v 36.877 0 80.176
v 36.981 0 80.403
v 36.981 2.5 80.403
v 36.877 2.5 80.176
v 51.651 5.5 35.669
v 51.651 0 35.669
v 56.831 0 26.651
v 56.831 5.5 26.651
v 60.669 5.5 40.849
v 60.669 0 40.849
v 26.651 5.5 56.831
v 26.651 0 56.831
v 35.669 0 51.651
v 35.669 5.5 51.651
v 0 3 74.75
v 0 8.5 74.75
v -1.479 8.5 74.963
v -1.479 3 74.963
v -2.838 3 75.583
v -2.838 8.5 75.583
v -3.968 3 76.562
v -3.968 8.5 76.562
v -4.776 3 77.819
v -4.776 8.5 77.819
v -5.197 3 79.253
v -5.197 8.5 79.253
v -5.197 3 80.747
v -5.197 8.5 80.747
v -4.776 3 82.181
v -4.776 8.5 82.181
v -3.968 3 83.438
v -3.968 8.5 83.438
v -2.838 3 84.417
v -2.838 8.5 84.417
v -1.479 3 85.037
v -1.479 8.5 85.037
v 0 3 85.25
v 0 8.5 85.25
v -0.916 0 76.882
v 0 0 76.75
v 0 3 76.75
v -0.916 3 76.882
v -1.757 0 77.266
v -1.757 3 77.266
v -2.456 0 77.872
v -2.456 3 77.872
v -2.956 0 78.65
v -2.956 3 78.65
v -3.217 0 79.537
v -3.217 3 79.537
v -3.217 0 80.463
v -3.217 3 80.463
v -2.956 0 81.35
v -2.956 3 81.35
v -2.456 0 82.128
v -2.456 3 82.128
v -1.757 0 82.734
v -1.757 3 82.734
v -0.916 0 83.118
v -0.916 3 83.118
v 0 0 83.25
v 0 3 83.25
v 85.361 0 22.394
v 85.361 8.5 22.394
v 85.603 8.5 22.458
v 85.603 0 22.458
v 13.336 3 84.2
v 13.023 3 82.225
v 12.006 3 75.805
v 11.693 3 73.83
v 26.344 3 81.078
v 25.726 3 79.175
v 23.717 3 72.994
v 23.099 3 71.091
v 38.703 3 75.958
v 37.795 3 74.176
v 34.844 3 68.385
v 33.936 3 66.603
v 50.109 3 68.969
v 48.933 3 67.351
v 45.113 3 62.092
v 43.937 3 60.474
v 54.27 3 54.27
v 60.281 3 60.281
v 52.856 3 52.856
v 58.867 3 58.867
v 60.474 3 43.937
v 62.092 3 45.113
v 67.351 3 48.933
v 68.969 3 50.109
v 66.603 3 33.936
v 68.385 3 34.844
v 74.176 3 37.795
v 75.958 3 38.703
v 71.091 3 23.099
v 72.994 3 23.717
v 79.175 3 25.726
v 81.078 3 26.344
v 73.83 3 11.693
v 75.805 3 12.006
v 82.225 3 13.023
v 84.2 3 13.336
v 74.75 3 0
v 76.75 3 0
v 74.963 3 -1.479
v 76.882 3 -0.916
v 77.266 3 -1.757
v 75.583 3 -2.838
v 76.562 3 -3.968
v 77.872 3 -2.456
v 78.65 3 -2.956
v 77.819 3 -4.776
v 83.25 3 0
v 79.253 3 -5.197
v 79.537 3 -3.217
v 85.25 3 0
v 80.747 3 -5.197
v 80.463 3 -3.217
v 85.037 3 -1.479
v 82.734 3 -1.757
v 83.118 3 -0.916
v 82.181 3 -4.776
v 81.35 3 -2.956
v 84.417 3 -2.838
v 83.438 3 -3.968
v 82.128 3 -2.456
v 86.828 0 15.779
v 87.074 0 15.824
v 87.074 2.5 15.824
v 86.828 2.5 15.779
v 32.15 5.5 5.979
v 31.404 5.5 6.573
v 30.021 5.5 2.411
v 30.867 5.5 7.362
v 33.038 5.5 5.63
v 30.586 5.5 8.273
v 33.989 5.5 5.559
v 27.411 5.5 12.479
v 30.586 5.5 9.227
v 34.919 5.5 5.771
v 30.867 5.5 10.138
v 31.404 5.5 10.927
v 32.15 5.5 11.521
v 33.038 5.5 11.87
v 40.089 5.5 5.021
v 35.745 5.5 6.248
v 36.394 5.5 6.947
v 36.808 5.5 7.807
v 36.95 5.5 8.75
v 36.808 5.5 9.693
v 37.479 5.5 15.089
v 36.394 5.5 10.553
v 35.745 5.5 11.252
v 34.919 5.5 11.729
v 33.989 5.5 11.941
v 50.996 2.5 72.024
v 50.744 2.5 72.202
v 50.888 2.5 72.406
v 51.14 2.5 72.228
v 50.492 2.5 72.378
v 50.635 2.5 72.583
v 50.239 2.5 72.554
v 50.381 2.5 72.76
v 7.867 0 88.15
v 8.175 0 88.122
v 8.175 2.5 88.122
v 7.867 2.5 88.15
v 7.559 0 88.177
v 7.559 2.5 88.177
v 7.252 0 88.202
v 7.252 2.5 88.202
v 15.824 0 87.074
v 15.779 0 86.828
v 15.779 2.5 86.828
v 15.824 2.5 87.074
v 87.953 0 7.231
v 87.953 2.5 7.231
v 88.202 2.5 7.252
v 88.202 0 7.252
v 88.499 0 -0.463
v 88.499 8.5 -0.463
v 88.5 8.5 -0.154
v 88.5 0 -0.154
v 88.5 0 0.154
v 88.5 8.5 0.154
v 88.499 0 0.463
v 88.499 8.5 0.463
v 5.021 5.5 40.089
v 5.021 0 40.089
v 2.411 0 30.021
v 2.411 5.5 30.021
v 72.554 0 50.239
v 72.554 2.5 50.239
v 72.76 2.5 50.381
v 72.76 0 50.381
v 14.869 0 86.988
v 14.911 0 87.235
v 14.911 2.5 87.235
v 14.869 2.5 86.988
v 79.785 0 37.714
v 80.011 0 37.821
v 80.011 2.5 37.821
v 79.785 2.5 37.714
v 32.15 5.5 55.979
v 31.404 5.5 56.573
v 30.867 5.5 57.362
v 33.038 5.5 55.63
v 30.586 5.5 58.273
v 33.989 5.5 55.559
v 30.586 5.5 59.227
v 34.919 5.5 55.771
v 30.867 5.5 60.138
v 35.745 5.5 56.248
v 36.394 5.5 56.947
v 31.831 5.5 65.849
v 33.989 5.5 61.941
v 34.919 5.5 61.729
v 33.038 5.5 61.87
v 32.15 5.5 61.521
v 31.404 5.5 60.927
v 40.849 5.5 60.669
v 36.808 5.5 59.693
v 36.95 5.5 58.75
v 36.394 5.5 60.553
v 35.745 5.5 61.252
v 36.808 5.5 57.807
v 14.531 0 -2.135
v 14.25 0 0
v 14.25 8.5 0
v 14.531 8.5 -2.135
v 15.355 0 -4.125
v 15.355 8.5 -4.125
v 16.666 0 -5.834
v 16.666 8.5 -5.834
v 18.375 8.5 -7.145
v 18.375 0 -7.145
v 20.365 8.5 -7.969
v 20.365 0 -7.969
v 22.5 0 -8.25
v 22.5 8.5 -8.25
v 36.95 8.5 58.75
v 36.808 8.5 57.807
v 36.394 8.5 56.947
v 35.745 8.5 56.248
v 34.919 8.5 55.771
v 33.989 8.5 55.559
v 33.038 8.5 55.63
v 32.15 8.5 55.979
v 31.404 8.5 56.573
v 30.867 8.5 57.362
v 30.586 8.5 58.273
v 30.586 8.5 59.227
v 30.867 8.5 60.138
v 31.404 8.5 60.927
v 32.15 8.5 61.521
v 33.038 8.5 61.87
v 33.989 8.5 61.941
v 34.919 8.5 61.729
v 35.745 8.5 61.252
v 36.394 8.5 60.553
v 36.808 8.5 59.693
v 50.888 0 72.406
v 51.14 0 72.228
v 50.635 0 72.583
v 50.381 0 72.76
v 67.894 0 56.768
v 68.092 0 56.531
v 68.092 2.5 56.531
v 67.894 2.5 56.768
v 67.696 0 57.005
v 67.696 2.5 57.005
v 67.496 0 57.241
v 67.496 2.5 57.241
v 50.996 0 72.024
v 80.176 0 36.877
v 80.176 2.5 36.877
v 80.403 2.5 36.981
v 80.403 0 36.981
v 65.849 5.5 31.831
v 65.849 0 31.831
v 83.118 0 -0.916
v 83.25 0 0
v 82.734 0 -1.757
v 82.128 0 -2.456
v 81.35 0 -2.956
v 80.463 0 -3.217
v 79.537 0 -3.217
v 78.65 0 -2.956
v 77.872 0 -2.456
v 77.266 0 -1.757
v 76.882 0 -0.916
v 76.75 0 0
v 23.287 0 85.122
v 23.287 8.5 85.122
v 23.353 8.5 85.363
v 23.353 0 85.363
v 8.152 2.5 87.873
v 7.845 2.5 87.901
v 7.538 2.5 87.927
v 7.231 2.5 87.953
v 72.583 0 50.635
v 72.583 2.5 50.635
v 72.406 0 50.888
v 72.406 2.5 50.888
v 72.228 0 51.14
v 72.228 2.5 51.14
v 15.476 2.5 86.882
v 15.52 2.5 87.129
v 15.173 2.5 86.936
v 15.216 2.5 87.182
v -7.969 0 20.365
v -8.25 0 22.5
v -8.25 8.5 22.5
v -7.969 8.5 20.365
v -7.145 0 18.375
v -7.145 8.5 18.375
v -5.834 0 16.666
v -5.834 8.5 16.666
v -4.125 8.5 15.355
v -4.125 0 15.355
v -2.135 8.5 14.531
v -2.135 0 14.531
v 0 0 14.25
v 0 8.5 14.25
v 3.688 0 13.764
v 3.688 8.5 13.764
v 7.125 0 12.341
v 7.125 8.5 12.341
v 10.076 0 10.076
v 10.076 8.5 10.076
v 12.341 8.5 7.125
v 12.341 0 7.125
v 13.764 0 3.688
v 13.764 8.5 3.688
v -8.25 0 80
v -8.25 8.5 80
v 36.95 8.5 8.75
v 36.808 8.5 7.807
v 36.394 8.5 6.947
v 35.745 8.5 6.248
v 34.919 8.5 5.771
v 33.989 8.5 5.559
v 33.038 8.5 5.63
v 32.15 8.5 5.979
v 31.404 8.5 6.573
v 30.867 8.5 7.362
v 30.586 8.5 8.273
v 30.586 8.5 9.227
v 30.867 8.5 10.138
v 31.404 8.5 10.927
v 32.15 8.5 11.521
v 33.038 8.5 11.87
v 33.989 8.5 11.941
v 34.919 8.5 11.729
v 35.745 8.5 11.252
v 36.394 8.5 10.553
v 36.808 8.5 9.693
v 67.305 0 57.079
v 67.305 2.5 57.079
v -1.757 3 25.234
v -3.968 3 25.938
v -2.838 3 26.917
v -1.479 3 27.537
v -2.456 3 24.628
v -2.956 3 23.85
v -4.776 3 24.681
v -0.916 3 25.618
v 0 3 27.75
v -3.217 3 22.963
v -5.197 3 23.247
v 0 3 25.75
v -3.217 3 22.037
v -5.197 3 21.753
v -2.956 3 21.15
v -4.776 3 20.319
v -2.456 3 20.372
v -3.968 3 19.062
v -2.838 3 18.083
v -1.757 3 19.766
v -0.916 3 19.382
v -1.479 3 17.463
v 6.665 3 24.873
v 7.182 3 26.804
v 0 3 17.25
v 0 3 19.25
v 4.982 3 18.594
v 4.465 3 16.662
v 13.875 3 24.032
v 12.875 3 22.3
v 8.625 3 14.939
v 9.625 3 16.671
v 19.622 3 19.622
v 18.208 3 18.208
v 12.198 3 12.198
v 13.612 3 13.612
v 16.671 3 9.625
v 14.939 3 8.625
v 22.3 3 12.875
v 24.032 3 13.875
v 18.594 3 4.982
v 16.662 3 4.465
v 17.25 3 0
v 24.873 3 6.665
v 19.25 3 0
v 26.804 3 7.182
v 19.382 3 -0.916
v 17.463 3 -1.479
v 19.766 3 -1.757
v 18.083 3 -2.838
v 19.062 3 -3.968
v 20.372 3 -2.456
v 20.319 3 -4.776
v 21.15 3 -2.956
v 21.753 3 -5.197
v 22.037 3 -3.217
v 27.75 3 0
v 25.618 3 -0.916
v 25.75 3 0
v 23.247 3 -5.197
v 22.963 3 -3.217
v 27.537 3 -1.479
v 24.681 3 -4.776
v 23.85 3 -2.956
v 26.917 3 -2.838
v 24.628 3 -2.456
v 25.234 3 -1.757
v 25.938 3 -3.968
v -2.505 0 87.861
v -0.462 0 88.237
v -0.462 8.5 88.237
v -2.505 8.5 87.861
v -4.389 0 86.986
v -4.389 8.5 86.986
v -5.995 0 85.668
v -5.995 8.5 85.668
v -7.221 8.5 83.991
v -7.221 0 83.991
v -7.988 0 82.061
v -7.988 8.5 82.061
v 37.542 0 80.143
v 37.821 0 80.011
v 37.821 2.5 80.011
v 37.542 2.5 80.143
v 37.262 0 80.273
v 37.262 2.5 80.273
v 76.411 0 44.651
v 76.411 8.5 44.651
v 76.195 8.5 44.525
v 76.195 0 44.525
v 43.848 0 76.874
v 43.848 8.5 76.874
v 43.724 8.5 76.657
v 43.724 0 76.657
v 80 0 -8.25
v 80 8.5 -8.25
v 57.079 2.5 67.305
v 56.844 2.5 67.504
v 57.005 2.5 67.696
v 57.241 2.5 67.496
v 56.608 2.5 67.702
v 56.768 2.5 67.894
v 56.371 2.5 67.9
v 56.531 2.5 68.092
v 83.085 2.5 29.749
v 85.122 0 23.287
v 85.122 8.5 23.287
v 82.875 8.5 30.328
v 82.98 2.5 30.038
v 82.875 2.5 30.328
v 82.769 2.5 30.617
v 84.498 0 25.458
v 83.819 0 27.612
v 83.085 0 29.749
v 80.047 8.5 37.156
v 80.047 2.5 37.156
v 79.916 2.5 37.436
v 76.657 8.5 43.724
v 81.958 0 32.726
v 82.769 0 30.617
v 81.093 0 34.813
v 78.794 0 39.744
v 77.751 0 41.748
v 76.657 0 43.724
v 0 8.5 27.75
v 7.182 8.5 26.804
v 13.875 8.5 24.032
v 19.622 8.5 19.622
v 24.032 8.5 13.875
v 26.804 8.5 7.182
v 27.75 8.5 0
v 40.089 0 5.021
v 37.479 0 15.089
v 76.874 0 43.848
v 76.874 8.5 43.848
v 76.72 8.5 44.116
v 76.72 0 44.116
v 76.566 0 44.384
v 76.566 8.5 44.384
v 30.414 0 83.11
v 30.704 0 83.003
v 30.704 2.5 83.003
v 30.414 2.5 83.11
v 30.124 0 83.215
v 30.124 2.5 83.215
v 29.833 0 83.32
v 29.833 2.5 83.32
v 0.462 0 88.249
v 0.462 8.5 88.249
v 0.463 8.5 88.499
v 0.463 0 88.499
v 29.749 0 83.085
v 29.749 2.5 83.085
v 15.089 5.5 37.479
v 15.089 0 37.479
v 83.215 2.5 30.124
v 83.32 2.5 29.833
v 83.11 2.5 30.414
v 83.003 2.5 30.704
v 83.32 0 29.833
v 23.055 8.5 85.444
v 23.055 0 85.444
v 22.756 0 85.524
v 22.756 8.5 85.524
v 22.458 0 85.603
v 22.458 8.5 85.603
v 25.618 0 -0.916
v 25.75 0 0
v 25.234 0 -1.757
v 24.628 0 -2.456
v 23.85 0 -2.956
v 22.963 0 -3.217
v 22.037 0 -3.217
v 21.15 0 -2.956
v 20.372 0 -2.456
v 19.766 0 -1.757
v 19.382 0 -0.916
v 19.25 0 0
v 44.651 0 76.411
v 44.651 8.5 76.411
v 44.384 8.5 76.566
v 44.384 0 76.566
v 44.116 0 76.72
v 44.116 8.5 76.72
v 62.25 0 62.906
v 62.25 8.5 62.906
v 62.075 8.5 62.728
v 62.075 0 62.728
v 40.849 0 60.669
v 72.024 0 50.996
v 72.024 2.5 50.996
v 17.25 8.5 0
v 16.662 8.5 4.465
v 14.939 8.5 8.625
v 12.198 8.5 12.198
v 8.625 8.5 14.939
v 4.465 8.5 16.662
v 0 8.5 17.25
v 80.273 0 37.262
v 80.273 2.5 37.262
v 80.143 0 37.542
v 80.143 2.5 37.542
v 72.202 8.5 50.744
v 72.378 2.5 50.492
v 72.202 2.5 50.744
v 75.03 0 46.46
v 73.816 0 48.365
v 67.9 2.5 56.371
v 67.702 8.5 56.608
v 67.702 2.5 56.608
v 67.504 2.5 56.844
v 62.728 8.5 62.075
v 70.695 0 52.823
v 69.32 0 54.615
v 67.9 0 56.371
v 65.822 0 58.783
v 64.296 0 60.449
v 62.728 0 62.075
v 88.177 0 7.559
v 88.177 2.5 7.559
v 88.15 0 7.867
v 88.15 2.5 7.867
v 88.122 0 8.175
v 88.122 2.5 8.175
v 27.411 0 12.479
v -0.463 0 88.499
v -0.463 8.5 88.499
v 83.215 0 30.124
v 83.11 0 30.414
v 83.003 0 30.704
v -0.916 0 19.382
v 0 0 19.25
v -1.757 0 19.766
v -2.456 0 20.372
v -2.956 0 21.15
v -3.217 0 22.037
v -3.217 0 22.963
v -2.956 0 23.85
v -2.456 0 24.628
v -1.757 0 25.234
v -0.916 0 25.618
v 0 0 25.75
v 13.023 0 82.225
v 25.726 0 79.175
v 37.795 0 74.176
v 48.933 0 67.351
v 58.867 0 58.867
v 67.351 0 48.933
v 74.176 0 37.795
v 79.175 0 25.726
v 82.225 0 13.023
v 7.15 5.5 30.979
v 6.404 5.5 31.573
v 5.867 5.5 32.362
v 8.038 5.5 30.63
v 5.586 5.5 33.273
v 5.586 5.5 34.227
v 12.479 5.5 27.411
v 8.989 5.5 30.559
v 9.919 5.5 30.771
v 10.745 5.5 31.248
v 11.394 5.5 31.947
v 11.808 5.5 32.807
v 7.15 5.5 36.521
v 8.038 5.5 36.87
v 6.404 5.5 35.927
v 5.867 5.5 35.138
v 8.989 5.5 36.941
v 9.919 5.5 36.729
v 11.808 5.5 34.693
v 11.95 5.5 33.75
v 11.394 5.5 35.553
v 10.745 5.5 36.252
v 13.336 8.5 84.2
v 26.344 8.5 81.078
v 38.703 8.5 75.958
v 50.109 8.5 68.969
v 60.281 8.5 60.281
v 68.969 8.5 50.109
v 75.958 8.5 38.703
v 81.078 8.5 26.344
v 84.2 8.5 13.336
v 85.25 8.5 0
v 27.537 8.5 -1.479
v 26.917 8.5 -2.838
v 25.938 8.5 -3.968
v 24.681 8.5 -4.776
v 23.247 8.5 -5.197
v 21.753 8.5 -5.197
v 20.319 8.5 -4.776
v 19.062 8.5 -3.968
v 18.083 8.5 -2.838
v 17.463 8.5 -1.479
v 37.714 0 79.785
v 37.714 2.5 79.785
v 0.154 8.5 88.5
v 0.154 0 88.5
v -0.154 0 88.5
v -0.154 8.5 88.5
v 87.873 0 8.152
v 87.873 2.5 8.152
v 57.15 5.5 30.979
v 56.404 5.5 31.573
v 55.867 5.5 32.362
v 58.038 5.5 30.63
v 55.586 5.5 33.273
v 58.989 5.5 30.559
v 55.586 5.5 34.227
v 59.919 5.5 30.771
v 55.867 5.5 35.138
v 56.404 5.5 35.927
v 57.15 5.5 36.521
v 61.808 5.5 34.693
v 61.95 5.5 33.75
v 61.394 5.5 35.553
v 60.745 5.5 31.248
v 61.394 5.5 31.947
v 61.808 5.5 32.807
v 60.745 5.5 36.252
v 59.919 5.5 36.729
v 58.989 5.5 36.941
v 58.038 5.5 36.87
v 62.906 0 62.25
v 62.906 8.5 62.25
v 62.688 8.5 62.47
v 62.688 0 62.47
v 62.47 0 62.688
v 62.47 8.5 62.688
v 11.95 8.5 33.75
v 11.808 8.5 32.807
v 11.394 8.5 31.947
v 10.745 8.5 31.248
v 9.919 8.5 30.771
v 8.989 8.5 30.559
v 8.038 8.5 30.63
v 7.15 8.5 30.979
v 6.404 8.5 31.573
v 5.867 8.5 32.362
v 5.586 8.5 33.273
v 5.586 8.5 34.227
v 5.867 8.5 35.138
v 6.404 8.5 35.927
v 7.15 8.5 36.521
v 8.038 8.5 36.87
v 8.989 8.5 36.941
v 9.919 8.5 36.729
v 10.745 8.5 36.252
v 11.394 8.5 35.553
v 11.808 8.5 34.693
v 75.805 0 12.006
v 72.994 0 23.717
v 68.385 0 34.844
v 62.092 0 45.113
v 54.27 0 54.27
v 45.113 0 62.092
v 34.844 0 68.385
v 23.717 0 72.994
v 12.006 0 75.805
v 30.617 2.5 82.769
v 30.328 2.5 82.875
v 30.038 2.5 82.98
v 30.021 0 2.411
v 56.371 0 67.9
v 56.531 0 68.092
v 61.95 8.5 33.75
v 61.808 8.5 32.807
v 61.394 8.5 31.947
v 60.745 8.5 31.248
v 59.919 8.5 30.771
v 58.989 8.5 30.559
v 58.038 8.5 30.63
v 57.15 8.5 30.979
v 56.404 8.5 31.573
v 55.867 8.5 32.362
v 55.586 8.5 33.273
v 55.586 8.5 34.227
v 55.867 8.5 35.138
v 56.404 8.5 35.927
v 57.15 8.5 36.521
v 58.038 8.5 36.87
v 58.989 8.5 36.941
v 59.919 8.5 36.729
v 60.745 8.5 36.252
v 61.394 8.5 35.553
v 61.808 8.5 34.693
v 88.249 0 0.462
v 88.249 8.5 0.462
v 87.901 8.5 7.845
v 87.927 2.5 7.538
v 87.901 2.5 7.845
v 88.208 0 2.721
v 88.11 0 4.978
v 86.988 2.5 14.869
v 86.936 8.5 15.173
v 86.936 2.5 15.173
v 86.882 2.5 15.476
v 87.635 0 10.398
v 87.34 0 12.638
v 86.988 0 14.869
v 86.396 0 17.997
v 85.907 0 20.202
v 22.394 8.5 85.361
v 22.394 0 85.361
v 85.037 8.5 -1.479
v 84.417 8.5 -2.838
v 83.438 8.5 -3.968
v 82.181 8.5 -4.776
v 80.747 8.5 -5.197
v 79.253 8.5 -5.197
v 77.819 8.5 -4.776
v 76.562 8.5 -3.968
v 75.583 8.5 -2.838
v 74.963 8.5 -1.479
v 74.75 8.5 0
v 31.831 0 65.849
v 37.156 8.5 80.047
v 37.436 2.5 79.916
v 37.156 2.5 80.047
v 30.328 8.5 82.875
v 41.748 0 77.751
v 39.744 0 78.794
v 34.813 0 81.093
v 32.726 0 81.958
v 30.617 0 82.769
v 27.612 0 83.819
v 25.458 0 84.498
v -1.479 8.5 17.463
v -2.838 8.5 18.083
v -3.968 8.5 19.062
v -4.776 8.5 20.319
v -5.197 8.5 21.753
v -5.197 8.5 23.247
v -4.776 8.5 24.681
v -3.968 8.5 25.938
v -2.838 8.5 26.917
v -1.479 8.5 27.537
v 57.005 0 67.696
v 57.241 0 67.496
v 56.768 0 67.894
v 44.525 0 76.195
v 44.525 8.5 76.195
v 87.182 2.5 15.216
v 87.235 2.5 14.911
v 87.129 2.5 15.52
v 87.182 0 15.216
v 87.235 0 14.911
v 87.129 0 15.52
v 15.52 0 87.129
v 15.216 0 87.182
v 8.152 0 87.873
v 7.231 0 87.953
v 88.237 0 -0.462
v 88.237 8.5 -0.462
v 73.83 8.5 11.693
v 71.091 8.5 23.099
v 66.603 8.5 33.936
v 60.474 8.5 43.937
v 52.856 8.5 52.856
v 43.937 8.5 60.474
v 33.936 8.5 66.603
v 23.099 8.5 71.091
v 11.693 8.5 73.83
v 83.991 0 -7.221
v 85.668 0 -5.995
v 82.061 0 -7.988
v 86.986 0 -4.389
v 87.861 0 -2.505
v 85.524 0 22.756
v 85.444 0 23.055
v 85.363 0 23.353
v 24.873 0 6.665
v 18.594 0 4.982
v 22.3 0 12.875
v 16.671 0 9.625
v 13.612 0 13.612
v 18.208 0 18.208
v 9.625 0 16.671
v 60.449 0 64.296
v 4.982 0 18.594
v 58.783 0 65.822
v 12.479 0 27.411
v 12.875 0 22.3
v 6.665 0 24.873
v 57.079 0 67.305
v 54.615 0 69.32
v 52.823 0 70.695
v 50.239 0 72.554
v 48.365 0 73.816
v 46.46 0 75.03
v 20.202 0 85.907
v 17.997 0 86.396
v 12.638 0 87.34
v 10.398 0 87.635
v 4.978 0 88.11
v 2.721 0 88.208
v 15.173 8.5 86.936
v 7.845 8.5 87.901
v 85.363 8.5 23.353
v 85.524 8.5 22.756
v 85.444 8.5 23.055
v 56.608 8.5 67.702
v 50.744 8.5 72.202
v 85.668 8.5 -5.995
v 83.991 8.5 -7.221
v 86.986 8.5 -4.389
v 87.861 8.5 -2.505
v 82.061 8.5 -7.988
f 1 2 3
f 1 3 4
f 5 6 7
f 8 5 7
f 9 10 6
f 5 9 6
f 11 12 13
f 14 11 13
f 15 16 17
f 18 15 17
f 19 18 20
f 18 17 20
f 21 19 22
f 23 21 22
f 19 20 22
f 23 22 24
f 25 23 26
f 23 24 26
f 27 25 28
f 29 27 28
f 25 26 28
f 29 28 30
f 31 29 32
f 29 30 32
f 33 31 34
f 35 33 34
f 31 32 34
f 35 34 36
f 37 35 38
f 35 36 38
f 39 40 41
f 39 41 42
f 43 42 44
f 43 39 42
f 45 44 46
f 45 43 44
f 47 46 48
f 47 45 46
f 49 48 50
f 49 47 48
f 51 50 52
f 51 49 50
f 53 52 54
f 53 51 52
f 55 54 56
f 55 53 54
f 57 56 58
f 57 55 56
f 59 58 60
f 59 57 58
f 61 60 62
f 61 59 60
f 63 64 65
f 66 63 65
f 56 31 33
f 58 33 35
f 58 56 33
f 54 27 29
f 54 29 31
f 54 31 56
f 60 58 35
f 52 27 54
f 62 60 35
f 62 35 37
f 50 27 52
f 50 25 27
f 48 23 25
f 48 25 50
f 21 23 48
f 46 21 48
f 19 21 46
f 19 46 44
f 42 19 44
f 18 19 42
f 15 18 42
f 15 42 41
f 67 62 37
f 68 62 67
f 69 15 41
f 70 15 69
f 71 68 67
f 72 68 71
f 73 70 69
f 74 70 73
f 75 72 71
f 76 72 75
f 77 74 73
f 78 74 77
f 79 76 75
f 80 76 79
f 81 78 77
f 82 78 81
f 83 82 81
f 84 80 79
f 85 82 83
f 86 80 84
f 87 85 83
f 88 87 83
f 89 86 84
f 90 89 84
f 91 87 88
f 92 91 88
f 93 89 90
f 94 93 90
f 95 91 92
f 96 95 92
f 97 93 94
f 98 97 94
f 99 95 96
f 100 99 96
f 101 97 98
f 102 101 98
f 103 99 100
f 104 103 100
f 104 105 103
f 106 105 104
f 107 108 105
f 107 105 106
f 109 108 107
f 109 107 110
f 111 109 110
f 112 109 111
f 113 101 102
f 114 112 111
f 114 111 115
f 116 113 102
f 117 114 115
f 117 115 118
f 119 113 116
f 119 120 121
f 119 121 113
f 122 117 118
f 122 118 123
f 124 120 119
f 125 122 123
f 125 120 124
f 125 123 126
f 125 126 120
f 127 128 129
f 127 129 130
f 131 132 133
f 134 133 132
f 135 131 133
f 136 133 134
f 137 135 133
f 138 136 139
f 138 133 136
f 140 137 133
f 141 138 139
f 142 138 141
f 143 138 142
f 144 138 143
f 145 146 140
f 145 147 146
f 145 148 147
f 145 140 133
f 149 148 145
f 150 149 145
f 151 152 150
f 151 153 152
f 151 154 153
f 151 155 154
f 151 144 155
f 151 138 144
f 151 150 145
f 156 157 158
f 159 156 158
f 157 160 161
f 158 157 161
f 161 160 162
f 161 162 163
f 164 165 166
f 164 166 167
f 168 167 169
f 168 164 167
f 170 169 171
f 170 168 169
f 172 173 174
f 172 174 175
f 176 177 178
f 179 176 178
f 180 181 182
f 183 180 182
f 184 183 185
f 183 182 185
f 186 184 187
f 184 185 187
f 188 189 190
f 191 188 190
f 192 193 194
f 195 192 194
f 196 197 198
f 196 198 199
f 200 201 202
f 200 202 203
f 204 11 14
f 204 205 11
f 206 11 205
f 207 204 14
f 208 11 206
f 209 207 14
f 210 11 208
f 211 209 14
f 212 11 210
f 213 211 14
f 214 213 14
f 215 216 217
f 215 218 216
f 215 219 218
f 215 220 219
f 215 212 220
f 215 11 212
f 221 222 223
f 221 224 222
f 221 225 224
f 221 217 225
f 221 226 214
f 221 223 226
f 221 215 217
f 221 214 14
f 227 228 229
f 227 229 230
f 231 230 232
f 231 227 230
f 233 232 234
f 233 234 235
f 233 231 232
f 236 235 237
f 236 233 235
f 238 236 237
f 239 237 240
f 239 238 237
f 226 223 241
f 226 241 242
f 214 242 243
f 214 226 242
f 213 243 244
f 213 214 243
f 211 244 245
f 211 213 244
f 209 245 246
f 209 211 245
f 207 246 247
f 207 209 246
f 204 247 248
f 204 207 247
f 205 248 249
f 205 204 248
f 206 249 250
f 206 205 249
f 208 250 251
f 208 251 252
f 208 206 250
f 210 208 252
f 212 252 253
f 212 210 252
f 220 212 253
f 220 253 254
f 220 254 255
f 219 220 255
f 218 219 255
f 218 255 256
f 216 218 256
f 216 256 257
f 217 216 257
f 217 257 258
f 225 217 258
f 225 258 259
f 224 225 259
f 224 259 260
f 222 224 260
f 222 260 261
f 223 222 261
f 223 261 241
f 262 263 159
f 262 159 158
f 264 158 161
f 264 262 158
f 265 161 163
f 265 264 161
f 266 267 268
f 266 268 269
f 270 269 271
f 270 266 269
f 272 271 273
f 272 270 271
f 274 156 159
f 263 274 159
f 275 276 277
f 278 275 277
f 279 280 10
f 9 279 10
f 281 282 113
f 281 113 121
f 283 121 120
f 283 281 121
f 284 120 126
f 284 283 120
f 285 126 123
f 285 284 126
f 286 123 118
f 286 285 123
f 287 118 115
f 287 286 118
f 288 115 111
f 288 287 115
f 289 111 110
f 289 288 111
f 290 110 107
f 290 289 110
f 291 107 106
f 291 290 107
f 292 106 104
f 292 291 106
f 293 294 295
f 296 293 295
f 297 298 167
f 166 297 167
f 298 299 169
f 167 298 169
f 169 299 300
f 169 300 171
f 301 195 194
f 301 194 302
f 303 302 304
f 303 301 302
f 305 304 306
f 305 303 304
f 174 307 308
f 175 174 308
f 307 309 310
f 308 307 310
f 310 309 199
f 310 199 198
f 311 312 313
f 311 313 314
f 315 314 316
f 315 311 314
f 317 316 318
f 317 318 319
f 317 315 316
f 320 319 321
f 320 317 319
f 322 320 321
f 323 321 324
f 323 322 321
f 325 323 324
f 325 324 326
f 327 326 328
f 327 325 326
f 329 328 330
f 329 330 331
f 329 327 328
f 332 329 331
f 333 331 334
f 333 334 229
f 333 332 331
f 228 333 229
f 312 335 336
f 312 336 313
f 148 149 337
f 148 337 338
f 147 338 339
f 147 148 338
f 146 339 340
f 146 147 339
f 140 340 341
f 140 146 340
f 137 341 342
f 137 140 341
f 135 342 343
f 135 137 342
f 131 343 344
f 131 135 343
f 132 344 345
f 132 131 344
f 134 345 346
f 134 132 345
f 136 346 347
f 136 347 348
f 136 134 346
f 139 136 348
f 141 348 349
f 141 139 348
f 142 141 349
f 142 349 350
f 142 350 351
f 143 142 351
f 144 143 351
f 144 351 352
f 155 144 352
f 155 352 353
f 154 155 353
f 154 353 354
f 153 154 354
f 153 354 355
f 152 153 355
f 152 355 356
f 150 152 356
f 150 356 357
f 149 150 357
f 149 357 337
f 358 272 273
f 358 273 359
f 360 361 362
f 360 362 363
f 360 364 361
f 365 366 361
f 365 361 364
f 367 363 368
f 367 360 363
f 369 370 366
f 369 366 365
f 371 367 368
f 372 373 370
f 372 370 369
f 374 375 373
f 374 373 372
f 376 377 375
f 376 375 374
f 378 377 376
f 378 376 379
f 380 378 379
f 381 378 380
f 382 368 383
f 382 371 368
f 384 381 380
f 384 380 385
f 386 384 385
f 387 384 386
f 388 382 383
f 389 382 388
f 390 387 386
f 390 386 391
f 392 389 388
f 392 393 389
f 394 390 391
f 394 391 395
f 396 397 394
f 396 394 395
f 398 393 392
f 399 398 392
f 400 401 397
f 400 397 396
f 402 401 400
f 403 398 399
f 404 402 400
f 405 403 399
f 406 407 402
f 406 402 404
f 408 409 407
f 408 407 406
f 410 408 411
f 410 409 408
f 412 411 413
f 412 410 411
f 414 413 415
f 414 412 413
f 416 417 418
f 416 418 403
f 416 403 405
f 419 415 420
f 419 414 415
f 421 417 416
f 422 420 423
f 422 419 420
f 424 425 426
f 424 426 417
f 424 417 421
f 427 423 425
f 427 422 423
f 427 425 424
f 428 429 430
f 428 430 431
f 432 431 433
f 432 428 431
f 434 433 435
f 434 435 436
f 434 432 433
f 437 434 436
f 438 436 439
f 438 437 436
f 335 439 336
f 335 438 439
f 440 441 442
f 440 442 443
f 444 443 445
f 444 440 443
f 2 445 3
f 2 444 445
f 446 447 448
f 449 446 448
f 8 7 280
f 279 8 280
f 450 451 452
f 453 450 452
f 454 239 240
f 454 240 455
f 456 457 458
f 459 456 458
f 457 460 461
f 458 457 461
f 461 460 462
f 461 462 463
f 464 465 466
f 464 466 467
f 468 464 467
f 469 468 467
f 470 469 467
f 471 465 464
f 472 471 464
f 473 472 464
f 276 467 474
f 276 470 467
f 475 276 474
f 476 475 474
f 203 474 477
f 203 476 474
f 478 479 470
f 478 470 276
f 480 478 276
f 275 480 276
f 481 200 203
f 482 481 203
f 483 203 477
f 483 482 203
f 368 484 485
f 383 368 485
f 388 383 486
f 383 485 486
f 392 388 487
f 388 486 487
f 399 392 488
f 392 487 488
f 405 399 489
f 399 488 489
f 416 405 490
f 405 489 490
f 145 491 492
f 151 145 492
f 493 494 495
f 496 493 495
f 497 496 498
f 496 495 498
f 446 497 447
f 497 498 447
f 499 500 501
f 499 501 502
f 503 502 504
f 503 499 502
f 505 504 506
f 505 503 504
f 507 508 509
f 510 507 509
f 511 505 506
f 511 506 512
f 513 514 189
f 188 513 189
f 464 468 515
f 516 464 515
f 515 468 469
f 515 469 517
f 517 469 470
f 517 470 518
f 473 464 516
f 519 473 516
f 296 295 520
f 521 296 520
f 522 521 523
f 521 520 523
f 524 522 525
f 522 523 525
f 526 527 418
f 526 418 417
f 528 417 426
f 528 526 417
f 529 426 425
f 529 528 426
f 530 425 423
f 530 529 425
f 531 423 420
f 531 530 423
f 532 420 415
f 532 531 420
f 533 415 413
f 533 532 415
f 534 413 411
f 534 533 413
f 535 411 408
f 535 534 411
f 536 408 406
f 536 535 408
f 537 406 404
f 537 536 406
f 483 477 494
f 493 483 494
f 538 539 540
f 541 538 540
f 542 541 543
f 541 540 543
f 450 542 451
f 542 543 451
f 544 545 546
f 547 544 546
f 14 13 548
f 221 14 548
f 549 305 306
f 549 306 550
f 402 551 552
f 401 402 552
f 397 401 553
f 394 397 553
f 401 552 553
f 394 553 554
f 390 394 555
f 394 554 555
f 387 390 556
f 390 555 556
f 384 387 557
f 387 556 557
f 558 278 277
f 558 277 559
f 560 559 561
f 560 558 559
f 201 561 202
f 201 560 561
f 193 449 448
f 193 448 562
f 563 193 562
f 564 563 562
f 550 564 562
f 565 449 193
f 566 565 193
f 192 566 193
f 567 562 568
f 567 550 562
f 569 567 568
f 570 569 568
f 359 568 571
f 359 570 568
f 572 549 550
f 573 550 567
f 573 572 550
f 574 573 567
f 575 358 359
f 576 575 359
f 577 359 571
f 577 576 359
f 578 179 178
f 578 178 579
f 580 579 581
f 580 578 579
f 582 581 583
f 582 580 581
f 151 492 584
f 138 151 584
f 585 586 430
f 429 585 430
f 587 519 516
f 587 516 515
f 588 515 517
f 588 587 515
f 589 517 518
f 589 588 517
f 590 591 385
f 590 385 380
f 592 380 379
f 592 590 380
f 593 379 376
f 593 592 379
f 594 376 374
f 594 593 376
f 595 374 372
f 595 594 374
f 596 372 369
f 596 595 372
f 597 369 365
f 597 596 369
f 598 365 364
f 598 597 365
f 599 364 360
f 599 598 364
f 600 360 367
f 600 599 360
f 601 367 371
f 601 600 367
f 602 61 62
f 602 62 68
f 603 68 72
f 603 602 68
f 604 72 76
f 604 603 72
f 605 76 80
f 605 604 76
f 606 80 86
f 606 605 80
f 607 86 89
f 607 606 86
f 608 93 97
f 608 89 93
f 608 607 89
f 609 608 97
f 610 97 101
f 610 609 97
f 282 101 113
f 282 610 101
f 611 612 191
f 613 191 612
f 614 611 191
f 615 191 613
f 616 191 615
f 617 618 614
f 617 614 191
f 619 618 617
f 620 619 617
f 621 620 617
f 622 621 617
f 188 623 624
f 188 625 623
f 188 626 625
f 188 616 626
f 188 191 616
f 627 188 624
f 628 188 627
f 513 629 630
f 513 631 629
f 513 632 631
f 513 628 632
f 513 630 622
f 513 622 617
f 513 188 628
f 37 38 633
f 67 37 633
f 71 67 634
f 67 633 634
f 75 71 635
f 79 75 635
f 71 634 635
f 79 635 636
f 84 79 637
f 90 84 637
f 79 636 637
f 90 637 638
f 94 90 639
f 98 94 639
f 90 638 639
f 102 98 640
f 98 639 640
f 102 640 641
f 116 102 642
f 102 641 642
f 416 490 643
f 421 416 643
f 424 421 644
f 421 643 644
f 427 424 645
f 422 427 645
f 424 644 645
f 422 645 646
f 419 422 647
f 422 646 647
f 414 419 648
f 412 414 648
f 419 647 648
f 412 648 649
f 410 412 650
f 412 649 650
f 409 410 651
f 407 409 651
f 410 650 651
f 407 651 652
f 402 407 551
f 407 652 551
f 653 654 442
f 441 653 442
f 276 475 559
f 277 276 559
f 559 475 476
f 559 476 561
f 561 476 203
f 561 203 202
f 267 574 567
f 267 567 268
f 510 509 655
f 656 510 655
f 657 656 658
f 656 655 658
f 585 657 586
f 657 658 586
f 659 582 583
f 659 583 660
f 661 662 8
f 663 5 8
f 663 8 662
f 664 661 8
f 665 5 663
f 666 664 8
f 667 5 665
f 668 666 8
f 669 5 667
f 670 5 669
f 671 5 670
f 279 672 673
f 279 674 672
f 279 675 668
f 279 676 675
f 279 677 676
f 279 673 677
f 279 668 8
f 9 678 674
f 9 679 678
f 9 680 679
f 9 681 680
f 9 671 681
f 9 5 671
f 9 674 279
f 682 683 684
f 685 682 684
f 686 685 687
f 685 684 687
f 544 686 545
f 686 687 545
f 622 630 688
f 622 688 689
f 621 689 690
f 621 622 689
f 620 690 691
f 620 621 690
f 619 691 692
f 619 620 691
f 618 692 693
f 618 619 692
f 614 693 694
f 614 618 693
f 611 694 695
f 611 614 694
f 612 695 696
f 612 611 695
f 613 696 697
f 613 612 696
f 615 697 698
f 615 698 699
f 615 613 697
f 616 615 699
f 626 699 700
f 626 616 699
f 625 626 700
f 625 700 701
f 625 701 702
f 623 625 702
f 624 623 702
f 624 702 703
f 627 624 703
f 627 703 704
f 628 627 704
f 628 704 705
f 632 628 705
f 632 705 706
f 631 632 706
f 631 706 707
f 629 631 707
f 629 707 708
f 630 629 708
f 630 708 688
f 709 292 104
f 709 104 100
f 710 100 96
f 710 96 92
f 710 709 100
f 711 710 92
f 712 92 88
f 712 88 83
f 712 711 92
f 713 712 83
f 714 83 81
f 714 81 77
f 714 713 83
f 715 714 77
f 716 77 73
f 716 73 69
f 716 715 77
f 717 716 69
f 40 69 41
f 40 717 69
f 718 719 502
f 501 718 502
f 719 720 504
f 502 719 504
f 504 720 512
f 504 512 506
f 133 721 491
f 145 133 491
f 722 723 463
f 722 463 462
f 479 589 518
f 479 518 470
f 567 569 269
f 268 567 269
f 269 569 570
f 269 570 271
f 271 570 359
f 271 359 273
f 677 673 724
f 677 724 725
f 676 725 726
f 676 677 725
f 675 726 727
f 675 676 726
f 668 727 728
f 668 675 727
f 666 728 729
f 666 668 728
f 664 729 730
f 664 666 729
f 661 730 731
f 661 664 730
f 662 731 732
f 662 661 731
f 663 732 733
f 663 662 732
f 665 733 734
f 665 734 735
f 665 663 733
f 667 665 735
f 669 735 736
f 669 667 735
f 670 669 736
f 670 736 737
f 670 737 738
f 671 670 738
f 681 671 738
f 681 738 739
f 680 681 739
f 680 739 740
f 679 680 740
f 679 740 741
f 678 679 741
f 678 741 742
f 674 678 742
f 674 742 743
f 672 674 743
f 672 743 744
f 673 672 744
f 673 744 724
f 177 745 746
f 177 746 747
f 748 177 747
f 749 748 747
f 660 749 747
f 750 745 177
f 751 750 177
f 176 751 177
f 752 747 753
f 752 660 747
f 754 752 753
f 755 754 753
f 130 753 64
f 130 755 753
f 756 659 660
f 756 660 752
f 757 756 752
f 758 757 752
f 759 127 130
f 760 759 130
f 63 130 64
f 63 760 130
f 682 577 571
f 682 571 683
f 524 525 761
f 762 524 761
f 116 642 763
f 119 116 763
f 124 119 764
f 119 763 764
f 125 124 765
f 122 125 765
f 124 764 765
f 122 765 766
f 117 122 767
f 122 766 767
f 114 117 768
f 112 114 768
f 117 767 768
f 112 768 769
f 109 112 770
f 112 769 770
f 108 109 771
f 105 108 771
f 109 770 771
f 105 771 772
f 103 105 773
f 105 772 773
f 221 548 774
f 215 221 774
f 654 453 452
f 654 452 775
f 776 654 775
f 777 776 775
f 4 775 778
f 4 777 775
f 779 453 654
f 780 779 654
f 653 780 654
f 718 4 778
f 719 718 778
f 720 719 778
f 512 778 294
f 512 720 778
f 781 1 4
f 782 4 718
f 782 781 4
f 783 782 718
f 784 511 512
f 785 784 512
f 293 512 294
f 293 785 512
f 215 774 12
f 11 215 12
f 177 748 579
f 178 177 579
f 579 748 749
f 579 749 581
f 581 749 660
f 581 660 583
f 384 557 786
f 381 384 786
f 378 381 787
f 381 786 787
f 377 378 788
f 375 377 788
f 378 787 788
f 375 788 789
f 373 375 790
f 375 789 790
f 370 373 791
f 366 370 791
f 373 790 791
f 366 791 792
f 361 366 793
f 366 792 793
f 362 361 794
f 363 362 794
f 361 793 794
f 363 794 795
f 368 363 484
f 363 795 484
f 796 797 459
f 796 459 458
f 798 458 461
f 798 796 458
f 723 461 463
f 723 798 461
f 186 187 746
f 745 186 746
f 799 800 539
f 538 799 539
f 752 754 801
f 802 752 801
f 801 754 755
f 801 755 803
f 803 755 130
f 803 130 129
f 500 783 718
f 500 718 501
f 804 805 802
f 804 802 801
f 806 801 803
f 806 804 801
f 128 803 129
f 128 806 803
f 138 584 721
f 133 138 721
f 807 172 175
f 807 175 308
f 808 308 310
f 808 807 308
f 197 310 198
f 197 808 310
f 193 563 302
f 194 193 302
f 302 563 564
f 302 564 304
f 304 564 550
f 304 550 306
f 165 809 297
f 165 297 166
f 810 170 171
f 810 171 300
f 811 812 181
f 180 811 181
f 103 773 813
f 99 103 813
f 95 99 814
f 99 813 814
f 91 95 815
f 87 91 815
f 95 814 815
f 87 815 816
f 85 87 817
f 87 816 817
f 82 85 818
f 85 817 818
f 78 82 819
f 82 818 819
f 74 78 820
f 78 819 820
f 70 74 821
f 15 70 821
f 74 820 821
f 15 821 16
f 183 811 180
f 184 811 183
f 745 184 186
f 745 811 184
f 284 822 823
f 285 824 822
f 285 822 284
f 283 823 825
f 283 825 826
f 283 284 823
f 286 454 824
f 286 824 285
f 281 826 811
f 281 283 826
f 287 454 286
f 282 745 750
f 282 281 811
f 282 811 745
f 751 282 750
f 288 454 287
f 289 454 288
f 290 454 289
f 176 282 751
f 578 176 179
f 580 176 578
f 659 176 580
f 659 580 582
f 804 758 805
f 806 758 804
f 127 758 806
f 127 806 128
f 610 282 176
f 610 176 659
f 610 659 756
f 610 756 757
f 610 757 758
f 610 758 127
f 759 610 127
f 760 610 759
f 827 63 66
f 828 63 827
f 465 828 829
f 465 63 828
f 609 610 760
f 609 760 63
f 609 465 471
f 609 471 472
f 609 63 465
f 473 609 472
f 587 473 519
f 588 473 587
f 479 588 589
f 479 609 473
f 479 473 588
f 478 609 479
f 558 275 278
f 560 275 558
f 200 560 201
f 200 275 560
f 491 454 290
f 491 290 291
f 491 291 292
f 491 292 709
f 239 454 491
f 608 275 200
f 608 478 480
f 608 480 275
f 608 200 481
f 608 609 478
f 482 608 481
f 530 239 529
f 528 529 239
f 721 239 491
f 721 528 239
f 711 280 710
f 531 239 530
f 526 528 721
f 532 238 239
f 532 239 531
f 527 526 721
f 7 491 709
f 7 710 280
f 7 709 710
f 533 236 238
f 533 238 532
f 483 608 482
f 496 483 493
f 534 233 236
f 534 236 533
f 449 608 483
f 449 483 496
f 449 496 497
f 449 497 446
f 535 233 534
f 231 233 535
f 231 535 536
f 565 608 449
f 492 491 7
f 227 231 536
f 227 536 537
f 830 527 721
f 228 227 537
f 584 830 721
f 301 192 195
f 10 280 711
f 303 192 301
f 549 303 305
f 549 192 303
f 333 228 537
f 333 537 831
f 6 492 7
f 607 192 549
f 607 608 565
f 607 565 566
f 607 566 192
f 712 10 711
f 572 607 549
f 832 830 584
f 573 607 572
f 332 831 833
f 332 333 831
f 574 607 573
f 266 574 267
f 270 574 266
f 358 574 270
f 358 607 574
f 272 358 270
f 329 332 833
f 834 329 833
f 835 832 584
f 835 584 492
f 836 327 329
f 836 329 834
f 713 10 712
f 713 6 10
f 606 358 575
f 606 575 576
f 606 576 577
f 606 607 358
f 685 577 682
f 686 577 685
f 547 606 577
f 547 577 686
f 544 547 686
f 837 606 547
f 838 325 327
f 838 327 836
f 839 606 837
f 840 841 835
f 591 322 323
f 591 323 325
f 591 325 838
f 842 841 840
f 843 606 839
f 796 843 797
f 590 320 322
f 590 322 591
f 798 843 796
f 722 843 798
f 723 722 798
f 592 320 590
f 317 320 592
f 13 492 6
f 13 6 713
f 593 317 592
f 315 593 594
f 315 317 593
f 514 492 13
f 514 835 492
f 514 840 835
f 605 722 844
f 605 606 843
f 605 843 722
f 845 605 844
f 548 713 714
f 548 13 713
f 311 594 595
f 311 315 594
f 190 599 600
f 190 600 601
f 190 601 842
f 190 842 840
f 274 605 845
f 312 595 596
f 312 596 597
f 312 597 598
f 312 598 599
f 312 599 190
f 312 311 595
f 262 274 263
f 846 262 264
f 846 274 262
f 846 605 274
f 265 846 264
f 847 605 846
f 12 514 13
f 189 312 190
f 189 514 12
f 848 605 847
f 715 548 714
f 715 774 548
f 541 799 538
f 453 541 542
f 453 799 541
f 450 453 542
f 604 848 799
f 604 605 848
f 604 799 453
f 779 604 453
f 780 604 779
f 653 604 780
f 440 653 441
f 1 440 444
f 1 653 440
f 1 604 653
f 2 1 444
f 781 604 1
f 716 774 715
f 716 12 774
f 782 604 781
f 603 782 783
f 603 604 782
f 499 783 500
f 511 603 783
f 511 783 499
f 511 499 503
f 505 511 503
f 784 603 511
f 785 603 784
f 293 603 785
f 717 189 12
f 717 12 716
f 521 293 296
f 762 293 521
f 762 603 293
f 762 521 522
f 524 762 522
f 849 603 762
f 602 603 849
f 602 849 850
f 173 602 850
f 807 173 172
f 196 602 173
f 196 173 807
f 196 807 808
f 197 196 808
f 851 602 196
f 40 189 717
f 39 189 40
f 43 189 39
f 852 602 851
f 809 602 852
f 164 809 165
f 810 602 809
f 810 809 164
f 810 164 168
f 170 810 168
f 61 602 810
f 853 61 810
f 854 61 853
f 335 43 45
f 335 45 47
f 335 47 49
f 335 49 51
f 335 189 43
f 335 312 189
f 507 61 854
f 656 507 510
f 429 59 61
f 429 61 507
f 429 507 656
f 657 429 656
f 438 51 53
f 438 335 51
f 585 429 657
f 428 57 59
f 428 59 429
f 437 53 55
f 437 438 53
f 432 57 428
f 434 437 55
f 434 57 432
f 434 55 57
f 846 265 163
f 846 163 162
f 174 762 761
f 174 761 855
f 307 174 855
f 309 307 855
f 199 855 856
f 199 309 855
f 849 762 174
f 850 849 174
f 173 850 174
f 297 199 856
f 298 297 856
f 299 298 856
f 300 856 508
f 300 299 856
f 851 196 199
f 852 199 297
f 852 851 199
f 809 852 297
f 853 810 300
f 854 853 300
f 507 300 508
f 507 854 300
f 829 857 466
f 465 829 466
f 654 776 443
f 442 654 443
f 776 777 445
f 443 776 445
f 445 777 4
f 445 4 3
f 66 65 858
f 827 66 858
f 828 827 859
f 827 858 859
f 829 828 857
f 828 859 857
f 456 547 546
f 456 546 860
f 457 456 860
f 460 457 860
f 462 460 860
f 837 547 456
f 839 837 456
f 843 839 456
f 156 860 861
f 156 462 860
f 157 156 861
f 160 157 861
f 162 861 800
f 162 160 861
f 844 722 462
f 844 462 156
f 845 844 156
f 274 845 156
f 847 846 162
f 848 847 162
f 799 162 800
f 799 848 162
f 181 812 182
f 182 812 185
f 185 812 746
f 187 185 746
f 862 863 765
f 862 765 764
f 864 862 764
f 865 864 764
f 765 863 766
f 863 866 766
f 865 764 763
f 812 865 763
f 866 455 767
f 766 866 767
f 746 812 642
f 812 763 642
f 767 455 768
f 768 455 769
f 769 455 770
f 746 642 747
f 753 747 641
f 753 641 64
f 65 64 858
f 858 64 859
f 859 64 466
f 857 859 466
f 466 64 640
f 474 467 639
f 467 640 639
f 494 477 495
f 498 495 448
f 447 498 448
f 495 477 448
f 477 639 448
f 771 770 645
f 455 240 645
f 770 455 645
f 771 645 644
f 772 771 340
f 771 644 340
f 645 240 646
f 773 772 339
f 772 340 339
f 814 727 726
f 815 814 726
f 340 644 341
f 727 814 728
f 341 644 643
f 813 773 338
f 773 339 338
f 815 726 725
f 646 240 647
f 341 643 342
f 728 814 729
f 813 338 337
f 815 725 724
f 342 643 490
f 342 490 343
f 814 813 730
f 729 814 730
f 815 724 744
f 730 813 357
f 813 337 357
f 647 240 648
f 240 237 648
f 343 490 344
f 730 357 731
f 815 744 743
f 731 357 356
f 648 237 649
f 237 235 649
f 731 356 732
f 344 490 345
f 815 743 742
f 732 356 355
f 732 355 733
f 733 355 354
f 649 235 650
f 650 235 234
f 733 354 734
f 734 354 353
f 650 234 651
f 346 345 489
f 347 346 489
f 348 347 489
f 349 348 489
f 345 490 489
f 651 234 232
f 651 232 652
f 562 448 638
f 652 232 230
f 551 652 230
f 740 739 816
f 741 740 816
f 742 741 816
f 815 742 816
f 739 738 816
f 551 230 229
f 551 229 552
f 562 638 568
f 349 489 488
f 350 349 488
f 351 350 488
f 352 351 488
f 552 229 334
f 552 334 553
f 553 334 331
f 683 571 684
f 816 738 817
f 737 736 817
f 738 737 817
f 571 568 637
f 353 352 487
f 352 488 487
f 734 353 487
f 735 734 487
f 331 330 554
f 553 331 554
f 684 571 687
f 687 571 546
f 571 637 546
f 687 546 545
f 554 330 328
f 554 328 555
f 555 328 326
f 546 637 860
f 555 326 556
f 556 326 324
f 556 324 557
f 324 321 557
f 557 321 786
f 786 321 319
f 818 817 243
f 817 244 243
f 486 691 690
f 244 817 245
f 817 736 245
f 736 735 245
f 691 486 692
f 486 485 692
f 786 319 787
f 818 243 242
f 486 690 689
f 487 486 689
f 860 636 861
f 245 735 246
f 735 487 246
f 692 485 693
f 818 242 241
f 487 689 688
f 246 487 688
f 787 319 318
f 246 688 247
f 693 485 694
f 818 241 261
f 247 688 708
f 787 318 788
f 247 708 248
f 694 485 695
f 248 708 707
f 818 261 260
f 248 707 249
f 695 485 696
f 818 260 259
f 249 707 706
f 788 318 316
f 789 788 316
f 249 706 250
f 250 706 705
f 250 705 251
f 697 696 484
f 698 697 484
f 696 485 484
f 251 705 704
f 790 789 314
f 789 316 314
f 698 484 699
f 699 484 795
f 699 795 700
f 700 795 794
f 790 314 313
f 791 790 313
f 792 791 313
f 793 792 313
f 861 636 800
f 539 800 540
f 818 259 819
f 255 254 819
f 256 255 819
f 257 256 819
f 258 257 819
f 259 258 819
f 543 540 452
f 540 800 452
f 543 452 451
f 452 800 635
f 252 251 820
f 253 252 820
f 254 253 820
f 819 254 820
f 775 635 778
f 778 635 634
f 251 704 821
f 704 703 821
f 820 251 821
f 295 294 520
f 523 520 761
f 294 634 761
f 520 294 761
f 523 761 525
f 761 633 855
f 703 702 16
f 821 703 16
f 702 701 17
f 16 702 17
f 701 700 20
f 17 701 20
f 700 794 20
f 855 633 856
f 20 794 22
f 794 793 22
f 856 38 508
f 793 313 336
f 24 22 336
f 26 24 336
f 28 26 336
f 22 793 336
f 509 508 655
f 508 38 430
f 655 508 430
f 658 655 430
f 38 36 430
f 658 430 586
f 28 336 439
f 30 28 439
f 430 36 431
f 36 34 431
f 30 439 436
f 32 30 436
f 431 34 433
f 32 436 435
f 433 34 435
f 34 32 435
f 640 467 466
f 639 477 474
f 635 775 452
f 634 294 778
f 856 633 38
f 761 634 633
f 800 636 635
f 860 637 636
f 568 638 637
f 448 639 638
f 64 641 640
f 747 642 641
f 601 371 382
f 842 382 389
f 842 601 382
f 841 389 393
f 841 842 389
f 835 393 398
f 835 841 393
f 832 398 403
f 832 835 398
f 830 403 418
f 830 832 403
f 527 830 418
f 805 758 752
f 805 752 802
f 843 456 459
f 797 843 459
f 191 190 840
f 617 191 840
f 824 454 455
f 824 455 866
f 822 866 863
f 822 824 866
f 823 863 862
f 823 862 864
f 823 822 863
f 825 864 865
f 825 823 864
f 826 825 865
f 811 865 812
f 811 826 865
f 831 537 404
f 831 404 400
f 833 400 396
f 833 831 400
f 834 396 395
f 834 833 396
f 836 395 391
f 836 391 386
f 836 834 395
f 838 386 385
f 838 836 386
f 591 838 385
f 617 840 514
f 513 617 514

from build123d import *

# Parameters (mm, degrees)
SKETCH_1_R               = 3.2
EXTRUDE_1_DEPTH          = 8.5
EXTRUDE_2_DEPTH          = 8.5
PATTERN_CIRCULAR_1_COUNT = 7
PATTERN_CIRCULAR_1_ANGLE = 90
EXTRUDE_3_DEPTH          = 2.5
PATTERN_CIRCULAR_2_COUNT = 19
PATTERN_CIRCULAR_2_ANGLE = 90
CUT_EXTRUDE_1_DEPTH      = 5.5
CUT_EXTRUDE_2_DEPTH      = 5.5


with BuildPart() as part:
    # 스케치1 → 보스-돌출1 (new body)
    with BuildSketch(Plane(origin=(0, 0, 0), x_dir=(1, 0, 0), z_dir=(0, 1, 0))):
        with BuildLine():
            Line((-8.25, -80), (-8.25, -22.5))
            ThreePointArc((-8.25, -22.5), (-5.833630945, -16.666369055), (0, -14.25))
            ThreePointArc((0, -14.25), (10.076271632, -10.076271632), (14.25, 0))
            ThreePointArc((14.25, 0), (16.666369055, 5.833630945), (22.5, 8.25))
            Line((22.5, 8.25), (80, 8.25))
            ThreePointArc((80, 8.25), (85.833630945, 5.833630945), (88.25, 0))
            ThreePointArc((88.25, 0), (62.40217344, -62.40217344), (0, -88.25))
            ThreePointArc((0, -88.25), (-5.833630945, -85.833630945), (-8.25, -80))
        make_face()
        with Locations((58.75, -33.75)):
            Circle(SKETCH_1_R, mode=Mode.SUBTRACT)
        with Locations((33.75, -58.75)):
            Circle(SKETCH_1_R, mode=Mode.SUBTRACT)
        with Locations((8.75, -33.75)):
            Circle(SKETCH_1_R, mode=Mode.SUBTRACT)
        with Locations((33.75, -8.75)):
            Circle(SKETCH_1_R, mode=Mode.SUBTRACT)
        with BuildLine():
            ThreePointArc((0, -19.25), (-3.25, -22.5), (0, -25.75))
            ThreePointArc((0, -25.75), (18.207999616, -18.207999616), (25.75, 0))
            ThreePointArc((25.75, 0), (22.5, 3.25), (19.25, 0))
            ThreePointArc((19.25, 0), (13.611805538, -13.611805538), (0, -19.25))
        make_face(mode=Mode.SUBTRACT)
        with BuildLine():
            ThreePointArc((0, -76.75), (-3.25, -80), (0, -83.25))
            ThreePointArc((0, -83.25), (58.866639534, -58.866639534), (83.25, 0))
            ThreePointArc((83.25, 0), (80, 3.25), (76.75, 0))
            ThreePointArc((76.75, 0), (54.270445456, -54.270445456), (0, -76.75))
        make_face(mode=Mode.SUBTRACT)
    extrude(amount=EXTRUDE_1_DEPTH)

    # 스케치2 → 보스-돌출2 (add)
    with BuildSketch(Plane(origin=(0, 8.5, 0), x_dir=(1, 0, 0), z_dir=(0, 1, 0))):
        with BuildLine():
            Line((0.458146835, -87.498800572), (0.463382799, -88.498786864))
            ThreePointArc((0.463382799, -88.498786864), (0, -88.5), (-0.463382799, -88.498786864))
            Line((-0.463382799, -88.498786864), (-0.458146835, -87.498800572))
            ThreePointArc((-0.458146835, -87.498800572), (0, -87.5), (0.458146835, -87.498800572))
        make_face()
    extrude_2 = extrude(amount=-EXTRUDE_2_DEPTH)

    # 원형 패턴1: 보스-돌출2 ×7 about axis
    pattern_circular_1_axis = Axis((0, 0, 0), (0, 1, 0))
    for i in range(1, PATTERN_CIRCULAR_1_COUNT):
        add(extrude_2.rotate(pattern_circular_1_axis, i * PATTERN_CIRCULAR_1_ANGLE / (PATTERN_CIRCULAR_1_COUNT - 1)))

    # 스케치6 → 보스-돌출3 (add)
    with BuildSketch(Plane.XZ):
        with BuildLine():
            Line((88.498786864, 0.463382799), (87.998793718, 0.460764817))
            ThreePointArc((87.998793718, 0.460764817), (88, 0), (87.998793718, -0.460764817))
            Line((87.998793718, -0.460764817), (88.498786864, -0.463382799))
            ThreePointArc((88.498786864, -0.463382799), (88.5, 0), (88.498786864, 0.463382799))
        make_face()
    extrude_3 = extrude(amount=-EXTRUDE_3_DEPTH)

    # 원형 패턴2: 보스-돌출3 ×19 about axis
    pattern_circular_2_axis = Axis((0, 8.5, 0), (0, -1, 0))
    for i in range(1, PATTERN_CIRCULAR_2_COUNT):
        add(extrude_3.rotate(pattern_circular_2_axis, i * PATTERN_CIRCULAR_2_ANGLE / (PATTERN_CIRCULAR_2_COUNT - 1)))

    # 스케치7 → 컷-돌출1 (cut)
    with BuildSketch(Plane.XZ):
        Polygon((26.650803984, 56.831298374), (35.668701626, 51.650803984), (40.849196016, 60.668701626), (31.831298374, 65.849196016), align=None)
        Polygon((51.650803984, 35.668701626), (56.831298374, 26.650803984), (65.849196016, 31.831298374), (60.668701626, 40.849196016), align=None)
        Polygon((30.021419355, 2.411412904), (40.088587096, 5.021419355), (37.478580645, 15.088587096), (27.411412904, 12.478580645), align=None)
        Polygon((2.411412904, 30.021419355), (12.478580645, 27.411412904), (15.088587096, 37.478580645), (5.021419355, 40.088587096), align=None)
    extrude(amount=-CUT_EXTRUDE_1_DEPTH, mode=Mode.SUBTRACT)

    # 스케치8 → 컷-돌출2 (cut)
    with BuildSketch(Plane(origin=(0, 8.5, 0), x_dir=(1, 0, 0), z_dir=(0, 1, 0))):
        with BuildLine():
            ThreePointArc((27.75, 0), (22.5, 5.25), (17.25, 0))
            ThreePointArc((17.25, 0), (12.197591975, -12.197591975), (0, -17.25))
            ThreePointArc((0, -17.25), (-5.25, -22.5), (0, -27.75))
            ThreePointArc((0, -27.75), (19.622213178, -19.622213178), (27.75, 0))
        make_face()
        with BuildLine():
            ThreePointArc((85.25, 0), (80, 5.25), (74.75, 0))
            ThreePointArc((74.75, 0), (52.856231894, -52.856231894), (0, -74.75))
            ThreePointArc((0, -74.75), (-5.25, -80), (0, -85.25))
            ThreePointArc((0, -85.25), (60.280853096, -60.280853096), (85.25, 0))
        make_face()
    extrude(amount=-CUT_EXTRUDE_2_DEPTH, mode=Mode.SUBTRACT)


solid = part.part
